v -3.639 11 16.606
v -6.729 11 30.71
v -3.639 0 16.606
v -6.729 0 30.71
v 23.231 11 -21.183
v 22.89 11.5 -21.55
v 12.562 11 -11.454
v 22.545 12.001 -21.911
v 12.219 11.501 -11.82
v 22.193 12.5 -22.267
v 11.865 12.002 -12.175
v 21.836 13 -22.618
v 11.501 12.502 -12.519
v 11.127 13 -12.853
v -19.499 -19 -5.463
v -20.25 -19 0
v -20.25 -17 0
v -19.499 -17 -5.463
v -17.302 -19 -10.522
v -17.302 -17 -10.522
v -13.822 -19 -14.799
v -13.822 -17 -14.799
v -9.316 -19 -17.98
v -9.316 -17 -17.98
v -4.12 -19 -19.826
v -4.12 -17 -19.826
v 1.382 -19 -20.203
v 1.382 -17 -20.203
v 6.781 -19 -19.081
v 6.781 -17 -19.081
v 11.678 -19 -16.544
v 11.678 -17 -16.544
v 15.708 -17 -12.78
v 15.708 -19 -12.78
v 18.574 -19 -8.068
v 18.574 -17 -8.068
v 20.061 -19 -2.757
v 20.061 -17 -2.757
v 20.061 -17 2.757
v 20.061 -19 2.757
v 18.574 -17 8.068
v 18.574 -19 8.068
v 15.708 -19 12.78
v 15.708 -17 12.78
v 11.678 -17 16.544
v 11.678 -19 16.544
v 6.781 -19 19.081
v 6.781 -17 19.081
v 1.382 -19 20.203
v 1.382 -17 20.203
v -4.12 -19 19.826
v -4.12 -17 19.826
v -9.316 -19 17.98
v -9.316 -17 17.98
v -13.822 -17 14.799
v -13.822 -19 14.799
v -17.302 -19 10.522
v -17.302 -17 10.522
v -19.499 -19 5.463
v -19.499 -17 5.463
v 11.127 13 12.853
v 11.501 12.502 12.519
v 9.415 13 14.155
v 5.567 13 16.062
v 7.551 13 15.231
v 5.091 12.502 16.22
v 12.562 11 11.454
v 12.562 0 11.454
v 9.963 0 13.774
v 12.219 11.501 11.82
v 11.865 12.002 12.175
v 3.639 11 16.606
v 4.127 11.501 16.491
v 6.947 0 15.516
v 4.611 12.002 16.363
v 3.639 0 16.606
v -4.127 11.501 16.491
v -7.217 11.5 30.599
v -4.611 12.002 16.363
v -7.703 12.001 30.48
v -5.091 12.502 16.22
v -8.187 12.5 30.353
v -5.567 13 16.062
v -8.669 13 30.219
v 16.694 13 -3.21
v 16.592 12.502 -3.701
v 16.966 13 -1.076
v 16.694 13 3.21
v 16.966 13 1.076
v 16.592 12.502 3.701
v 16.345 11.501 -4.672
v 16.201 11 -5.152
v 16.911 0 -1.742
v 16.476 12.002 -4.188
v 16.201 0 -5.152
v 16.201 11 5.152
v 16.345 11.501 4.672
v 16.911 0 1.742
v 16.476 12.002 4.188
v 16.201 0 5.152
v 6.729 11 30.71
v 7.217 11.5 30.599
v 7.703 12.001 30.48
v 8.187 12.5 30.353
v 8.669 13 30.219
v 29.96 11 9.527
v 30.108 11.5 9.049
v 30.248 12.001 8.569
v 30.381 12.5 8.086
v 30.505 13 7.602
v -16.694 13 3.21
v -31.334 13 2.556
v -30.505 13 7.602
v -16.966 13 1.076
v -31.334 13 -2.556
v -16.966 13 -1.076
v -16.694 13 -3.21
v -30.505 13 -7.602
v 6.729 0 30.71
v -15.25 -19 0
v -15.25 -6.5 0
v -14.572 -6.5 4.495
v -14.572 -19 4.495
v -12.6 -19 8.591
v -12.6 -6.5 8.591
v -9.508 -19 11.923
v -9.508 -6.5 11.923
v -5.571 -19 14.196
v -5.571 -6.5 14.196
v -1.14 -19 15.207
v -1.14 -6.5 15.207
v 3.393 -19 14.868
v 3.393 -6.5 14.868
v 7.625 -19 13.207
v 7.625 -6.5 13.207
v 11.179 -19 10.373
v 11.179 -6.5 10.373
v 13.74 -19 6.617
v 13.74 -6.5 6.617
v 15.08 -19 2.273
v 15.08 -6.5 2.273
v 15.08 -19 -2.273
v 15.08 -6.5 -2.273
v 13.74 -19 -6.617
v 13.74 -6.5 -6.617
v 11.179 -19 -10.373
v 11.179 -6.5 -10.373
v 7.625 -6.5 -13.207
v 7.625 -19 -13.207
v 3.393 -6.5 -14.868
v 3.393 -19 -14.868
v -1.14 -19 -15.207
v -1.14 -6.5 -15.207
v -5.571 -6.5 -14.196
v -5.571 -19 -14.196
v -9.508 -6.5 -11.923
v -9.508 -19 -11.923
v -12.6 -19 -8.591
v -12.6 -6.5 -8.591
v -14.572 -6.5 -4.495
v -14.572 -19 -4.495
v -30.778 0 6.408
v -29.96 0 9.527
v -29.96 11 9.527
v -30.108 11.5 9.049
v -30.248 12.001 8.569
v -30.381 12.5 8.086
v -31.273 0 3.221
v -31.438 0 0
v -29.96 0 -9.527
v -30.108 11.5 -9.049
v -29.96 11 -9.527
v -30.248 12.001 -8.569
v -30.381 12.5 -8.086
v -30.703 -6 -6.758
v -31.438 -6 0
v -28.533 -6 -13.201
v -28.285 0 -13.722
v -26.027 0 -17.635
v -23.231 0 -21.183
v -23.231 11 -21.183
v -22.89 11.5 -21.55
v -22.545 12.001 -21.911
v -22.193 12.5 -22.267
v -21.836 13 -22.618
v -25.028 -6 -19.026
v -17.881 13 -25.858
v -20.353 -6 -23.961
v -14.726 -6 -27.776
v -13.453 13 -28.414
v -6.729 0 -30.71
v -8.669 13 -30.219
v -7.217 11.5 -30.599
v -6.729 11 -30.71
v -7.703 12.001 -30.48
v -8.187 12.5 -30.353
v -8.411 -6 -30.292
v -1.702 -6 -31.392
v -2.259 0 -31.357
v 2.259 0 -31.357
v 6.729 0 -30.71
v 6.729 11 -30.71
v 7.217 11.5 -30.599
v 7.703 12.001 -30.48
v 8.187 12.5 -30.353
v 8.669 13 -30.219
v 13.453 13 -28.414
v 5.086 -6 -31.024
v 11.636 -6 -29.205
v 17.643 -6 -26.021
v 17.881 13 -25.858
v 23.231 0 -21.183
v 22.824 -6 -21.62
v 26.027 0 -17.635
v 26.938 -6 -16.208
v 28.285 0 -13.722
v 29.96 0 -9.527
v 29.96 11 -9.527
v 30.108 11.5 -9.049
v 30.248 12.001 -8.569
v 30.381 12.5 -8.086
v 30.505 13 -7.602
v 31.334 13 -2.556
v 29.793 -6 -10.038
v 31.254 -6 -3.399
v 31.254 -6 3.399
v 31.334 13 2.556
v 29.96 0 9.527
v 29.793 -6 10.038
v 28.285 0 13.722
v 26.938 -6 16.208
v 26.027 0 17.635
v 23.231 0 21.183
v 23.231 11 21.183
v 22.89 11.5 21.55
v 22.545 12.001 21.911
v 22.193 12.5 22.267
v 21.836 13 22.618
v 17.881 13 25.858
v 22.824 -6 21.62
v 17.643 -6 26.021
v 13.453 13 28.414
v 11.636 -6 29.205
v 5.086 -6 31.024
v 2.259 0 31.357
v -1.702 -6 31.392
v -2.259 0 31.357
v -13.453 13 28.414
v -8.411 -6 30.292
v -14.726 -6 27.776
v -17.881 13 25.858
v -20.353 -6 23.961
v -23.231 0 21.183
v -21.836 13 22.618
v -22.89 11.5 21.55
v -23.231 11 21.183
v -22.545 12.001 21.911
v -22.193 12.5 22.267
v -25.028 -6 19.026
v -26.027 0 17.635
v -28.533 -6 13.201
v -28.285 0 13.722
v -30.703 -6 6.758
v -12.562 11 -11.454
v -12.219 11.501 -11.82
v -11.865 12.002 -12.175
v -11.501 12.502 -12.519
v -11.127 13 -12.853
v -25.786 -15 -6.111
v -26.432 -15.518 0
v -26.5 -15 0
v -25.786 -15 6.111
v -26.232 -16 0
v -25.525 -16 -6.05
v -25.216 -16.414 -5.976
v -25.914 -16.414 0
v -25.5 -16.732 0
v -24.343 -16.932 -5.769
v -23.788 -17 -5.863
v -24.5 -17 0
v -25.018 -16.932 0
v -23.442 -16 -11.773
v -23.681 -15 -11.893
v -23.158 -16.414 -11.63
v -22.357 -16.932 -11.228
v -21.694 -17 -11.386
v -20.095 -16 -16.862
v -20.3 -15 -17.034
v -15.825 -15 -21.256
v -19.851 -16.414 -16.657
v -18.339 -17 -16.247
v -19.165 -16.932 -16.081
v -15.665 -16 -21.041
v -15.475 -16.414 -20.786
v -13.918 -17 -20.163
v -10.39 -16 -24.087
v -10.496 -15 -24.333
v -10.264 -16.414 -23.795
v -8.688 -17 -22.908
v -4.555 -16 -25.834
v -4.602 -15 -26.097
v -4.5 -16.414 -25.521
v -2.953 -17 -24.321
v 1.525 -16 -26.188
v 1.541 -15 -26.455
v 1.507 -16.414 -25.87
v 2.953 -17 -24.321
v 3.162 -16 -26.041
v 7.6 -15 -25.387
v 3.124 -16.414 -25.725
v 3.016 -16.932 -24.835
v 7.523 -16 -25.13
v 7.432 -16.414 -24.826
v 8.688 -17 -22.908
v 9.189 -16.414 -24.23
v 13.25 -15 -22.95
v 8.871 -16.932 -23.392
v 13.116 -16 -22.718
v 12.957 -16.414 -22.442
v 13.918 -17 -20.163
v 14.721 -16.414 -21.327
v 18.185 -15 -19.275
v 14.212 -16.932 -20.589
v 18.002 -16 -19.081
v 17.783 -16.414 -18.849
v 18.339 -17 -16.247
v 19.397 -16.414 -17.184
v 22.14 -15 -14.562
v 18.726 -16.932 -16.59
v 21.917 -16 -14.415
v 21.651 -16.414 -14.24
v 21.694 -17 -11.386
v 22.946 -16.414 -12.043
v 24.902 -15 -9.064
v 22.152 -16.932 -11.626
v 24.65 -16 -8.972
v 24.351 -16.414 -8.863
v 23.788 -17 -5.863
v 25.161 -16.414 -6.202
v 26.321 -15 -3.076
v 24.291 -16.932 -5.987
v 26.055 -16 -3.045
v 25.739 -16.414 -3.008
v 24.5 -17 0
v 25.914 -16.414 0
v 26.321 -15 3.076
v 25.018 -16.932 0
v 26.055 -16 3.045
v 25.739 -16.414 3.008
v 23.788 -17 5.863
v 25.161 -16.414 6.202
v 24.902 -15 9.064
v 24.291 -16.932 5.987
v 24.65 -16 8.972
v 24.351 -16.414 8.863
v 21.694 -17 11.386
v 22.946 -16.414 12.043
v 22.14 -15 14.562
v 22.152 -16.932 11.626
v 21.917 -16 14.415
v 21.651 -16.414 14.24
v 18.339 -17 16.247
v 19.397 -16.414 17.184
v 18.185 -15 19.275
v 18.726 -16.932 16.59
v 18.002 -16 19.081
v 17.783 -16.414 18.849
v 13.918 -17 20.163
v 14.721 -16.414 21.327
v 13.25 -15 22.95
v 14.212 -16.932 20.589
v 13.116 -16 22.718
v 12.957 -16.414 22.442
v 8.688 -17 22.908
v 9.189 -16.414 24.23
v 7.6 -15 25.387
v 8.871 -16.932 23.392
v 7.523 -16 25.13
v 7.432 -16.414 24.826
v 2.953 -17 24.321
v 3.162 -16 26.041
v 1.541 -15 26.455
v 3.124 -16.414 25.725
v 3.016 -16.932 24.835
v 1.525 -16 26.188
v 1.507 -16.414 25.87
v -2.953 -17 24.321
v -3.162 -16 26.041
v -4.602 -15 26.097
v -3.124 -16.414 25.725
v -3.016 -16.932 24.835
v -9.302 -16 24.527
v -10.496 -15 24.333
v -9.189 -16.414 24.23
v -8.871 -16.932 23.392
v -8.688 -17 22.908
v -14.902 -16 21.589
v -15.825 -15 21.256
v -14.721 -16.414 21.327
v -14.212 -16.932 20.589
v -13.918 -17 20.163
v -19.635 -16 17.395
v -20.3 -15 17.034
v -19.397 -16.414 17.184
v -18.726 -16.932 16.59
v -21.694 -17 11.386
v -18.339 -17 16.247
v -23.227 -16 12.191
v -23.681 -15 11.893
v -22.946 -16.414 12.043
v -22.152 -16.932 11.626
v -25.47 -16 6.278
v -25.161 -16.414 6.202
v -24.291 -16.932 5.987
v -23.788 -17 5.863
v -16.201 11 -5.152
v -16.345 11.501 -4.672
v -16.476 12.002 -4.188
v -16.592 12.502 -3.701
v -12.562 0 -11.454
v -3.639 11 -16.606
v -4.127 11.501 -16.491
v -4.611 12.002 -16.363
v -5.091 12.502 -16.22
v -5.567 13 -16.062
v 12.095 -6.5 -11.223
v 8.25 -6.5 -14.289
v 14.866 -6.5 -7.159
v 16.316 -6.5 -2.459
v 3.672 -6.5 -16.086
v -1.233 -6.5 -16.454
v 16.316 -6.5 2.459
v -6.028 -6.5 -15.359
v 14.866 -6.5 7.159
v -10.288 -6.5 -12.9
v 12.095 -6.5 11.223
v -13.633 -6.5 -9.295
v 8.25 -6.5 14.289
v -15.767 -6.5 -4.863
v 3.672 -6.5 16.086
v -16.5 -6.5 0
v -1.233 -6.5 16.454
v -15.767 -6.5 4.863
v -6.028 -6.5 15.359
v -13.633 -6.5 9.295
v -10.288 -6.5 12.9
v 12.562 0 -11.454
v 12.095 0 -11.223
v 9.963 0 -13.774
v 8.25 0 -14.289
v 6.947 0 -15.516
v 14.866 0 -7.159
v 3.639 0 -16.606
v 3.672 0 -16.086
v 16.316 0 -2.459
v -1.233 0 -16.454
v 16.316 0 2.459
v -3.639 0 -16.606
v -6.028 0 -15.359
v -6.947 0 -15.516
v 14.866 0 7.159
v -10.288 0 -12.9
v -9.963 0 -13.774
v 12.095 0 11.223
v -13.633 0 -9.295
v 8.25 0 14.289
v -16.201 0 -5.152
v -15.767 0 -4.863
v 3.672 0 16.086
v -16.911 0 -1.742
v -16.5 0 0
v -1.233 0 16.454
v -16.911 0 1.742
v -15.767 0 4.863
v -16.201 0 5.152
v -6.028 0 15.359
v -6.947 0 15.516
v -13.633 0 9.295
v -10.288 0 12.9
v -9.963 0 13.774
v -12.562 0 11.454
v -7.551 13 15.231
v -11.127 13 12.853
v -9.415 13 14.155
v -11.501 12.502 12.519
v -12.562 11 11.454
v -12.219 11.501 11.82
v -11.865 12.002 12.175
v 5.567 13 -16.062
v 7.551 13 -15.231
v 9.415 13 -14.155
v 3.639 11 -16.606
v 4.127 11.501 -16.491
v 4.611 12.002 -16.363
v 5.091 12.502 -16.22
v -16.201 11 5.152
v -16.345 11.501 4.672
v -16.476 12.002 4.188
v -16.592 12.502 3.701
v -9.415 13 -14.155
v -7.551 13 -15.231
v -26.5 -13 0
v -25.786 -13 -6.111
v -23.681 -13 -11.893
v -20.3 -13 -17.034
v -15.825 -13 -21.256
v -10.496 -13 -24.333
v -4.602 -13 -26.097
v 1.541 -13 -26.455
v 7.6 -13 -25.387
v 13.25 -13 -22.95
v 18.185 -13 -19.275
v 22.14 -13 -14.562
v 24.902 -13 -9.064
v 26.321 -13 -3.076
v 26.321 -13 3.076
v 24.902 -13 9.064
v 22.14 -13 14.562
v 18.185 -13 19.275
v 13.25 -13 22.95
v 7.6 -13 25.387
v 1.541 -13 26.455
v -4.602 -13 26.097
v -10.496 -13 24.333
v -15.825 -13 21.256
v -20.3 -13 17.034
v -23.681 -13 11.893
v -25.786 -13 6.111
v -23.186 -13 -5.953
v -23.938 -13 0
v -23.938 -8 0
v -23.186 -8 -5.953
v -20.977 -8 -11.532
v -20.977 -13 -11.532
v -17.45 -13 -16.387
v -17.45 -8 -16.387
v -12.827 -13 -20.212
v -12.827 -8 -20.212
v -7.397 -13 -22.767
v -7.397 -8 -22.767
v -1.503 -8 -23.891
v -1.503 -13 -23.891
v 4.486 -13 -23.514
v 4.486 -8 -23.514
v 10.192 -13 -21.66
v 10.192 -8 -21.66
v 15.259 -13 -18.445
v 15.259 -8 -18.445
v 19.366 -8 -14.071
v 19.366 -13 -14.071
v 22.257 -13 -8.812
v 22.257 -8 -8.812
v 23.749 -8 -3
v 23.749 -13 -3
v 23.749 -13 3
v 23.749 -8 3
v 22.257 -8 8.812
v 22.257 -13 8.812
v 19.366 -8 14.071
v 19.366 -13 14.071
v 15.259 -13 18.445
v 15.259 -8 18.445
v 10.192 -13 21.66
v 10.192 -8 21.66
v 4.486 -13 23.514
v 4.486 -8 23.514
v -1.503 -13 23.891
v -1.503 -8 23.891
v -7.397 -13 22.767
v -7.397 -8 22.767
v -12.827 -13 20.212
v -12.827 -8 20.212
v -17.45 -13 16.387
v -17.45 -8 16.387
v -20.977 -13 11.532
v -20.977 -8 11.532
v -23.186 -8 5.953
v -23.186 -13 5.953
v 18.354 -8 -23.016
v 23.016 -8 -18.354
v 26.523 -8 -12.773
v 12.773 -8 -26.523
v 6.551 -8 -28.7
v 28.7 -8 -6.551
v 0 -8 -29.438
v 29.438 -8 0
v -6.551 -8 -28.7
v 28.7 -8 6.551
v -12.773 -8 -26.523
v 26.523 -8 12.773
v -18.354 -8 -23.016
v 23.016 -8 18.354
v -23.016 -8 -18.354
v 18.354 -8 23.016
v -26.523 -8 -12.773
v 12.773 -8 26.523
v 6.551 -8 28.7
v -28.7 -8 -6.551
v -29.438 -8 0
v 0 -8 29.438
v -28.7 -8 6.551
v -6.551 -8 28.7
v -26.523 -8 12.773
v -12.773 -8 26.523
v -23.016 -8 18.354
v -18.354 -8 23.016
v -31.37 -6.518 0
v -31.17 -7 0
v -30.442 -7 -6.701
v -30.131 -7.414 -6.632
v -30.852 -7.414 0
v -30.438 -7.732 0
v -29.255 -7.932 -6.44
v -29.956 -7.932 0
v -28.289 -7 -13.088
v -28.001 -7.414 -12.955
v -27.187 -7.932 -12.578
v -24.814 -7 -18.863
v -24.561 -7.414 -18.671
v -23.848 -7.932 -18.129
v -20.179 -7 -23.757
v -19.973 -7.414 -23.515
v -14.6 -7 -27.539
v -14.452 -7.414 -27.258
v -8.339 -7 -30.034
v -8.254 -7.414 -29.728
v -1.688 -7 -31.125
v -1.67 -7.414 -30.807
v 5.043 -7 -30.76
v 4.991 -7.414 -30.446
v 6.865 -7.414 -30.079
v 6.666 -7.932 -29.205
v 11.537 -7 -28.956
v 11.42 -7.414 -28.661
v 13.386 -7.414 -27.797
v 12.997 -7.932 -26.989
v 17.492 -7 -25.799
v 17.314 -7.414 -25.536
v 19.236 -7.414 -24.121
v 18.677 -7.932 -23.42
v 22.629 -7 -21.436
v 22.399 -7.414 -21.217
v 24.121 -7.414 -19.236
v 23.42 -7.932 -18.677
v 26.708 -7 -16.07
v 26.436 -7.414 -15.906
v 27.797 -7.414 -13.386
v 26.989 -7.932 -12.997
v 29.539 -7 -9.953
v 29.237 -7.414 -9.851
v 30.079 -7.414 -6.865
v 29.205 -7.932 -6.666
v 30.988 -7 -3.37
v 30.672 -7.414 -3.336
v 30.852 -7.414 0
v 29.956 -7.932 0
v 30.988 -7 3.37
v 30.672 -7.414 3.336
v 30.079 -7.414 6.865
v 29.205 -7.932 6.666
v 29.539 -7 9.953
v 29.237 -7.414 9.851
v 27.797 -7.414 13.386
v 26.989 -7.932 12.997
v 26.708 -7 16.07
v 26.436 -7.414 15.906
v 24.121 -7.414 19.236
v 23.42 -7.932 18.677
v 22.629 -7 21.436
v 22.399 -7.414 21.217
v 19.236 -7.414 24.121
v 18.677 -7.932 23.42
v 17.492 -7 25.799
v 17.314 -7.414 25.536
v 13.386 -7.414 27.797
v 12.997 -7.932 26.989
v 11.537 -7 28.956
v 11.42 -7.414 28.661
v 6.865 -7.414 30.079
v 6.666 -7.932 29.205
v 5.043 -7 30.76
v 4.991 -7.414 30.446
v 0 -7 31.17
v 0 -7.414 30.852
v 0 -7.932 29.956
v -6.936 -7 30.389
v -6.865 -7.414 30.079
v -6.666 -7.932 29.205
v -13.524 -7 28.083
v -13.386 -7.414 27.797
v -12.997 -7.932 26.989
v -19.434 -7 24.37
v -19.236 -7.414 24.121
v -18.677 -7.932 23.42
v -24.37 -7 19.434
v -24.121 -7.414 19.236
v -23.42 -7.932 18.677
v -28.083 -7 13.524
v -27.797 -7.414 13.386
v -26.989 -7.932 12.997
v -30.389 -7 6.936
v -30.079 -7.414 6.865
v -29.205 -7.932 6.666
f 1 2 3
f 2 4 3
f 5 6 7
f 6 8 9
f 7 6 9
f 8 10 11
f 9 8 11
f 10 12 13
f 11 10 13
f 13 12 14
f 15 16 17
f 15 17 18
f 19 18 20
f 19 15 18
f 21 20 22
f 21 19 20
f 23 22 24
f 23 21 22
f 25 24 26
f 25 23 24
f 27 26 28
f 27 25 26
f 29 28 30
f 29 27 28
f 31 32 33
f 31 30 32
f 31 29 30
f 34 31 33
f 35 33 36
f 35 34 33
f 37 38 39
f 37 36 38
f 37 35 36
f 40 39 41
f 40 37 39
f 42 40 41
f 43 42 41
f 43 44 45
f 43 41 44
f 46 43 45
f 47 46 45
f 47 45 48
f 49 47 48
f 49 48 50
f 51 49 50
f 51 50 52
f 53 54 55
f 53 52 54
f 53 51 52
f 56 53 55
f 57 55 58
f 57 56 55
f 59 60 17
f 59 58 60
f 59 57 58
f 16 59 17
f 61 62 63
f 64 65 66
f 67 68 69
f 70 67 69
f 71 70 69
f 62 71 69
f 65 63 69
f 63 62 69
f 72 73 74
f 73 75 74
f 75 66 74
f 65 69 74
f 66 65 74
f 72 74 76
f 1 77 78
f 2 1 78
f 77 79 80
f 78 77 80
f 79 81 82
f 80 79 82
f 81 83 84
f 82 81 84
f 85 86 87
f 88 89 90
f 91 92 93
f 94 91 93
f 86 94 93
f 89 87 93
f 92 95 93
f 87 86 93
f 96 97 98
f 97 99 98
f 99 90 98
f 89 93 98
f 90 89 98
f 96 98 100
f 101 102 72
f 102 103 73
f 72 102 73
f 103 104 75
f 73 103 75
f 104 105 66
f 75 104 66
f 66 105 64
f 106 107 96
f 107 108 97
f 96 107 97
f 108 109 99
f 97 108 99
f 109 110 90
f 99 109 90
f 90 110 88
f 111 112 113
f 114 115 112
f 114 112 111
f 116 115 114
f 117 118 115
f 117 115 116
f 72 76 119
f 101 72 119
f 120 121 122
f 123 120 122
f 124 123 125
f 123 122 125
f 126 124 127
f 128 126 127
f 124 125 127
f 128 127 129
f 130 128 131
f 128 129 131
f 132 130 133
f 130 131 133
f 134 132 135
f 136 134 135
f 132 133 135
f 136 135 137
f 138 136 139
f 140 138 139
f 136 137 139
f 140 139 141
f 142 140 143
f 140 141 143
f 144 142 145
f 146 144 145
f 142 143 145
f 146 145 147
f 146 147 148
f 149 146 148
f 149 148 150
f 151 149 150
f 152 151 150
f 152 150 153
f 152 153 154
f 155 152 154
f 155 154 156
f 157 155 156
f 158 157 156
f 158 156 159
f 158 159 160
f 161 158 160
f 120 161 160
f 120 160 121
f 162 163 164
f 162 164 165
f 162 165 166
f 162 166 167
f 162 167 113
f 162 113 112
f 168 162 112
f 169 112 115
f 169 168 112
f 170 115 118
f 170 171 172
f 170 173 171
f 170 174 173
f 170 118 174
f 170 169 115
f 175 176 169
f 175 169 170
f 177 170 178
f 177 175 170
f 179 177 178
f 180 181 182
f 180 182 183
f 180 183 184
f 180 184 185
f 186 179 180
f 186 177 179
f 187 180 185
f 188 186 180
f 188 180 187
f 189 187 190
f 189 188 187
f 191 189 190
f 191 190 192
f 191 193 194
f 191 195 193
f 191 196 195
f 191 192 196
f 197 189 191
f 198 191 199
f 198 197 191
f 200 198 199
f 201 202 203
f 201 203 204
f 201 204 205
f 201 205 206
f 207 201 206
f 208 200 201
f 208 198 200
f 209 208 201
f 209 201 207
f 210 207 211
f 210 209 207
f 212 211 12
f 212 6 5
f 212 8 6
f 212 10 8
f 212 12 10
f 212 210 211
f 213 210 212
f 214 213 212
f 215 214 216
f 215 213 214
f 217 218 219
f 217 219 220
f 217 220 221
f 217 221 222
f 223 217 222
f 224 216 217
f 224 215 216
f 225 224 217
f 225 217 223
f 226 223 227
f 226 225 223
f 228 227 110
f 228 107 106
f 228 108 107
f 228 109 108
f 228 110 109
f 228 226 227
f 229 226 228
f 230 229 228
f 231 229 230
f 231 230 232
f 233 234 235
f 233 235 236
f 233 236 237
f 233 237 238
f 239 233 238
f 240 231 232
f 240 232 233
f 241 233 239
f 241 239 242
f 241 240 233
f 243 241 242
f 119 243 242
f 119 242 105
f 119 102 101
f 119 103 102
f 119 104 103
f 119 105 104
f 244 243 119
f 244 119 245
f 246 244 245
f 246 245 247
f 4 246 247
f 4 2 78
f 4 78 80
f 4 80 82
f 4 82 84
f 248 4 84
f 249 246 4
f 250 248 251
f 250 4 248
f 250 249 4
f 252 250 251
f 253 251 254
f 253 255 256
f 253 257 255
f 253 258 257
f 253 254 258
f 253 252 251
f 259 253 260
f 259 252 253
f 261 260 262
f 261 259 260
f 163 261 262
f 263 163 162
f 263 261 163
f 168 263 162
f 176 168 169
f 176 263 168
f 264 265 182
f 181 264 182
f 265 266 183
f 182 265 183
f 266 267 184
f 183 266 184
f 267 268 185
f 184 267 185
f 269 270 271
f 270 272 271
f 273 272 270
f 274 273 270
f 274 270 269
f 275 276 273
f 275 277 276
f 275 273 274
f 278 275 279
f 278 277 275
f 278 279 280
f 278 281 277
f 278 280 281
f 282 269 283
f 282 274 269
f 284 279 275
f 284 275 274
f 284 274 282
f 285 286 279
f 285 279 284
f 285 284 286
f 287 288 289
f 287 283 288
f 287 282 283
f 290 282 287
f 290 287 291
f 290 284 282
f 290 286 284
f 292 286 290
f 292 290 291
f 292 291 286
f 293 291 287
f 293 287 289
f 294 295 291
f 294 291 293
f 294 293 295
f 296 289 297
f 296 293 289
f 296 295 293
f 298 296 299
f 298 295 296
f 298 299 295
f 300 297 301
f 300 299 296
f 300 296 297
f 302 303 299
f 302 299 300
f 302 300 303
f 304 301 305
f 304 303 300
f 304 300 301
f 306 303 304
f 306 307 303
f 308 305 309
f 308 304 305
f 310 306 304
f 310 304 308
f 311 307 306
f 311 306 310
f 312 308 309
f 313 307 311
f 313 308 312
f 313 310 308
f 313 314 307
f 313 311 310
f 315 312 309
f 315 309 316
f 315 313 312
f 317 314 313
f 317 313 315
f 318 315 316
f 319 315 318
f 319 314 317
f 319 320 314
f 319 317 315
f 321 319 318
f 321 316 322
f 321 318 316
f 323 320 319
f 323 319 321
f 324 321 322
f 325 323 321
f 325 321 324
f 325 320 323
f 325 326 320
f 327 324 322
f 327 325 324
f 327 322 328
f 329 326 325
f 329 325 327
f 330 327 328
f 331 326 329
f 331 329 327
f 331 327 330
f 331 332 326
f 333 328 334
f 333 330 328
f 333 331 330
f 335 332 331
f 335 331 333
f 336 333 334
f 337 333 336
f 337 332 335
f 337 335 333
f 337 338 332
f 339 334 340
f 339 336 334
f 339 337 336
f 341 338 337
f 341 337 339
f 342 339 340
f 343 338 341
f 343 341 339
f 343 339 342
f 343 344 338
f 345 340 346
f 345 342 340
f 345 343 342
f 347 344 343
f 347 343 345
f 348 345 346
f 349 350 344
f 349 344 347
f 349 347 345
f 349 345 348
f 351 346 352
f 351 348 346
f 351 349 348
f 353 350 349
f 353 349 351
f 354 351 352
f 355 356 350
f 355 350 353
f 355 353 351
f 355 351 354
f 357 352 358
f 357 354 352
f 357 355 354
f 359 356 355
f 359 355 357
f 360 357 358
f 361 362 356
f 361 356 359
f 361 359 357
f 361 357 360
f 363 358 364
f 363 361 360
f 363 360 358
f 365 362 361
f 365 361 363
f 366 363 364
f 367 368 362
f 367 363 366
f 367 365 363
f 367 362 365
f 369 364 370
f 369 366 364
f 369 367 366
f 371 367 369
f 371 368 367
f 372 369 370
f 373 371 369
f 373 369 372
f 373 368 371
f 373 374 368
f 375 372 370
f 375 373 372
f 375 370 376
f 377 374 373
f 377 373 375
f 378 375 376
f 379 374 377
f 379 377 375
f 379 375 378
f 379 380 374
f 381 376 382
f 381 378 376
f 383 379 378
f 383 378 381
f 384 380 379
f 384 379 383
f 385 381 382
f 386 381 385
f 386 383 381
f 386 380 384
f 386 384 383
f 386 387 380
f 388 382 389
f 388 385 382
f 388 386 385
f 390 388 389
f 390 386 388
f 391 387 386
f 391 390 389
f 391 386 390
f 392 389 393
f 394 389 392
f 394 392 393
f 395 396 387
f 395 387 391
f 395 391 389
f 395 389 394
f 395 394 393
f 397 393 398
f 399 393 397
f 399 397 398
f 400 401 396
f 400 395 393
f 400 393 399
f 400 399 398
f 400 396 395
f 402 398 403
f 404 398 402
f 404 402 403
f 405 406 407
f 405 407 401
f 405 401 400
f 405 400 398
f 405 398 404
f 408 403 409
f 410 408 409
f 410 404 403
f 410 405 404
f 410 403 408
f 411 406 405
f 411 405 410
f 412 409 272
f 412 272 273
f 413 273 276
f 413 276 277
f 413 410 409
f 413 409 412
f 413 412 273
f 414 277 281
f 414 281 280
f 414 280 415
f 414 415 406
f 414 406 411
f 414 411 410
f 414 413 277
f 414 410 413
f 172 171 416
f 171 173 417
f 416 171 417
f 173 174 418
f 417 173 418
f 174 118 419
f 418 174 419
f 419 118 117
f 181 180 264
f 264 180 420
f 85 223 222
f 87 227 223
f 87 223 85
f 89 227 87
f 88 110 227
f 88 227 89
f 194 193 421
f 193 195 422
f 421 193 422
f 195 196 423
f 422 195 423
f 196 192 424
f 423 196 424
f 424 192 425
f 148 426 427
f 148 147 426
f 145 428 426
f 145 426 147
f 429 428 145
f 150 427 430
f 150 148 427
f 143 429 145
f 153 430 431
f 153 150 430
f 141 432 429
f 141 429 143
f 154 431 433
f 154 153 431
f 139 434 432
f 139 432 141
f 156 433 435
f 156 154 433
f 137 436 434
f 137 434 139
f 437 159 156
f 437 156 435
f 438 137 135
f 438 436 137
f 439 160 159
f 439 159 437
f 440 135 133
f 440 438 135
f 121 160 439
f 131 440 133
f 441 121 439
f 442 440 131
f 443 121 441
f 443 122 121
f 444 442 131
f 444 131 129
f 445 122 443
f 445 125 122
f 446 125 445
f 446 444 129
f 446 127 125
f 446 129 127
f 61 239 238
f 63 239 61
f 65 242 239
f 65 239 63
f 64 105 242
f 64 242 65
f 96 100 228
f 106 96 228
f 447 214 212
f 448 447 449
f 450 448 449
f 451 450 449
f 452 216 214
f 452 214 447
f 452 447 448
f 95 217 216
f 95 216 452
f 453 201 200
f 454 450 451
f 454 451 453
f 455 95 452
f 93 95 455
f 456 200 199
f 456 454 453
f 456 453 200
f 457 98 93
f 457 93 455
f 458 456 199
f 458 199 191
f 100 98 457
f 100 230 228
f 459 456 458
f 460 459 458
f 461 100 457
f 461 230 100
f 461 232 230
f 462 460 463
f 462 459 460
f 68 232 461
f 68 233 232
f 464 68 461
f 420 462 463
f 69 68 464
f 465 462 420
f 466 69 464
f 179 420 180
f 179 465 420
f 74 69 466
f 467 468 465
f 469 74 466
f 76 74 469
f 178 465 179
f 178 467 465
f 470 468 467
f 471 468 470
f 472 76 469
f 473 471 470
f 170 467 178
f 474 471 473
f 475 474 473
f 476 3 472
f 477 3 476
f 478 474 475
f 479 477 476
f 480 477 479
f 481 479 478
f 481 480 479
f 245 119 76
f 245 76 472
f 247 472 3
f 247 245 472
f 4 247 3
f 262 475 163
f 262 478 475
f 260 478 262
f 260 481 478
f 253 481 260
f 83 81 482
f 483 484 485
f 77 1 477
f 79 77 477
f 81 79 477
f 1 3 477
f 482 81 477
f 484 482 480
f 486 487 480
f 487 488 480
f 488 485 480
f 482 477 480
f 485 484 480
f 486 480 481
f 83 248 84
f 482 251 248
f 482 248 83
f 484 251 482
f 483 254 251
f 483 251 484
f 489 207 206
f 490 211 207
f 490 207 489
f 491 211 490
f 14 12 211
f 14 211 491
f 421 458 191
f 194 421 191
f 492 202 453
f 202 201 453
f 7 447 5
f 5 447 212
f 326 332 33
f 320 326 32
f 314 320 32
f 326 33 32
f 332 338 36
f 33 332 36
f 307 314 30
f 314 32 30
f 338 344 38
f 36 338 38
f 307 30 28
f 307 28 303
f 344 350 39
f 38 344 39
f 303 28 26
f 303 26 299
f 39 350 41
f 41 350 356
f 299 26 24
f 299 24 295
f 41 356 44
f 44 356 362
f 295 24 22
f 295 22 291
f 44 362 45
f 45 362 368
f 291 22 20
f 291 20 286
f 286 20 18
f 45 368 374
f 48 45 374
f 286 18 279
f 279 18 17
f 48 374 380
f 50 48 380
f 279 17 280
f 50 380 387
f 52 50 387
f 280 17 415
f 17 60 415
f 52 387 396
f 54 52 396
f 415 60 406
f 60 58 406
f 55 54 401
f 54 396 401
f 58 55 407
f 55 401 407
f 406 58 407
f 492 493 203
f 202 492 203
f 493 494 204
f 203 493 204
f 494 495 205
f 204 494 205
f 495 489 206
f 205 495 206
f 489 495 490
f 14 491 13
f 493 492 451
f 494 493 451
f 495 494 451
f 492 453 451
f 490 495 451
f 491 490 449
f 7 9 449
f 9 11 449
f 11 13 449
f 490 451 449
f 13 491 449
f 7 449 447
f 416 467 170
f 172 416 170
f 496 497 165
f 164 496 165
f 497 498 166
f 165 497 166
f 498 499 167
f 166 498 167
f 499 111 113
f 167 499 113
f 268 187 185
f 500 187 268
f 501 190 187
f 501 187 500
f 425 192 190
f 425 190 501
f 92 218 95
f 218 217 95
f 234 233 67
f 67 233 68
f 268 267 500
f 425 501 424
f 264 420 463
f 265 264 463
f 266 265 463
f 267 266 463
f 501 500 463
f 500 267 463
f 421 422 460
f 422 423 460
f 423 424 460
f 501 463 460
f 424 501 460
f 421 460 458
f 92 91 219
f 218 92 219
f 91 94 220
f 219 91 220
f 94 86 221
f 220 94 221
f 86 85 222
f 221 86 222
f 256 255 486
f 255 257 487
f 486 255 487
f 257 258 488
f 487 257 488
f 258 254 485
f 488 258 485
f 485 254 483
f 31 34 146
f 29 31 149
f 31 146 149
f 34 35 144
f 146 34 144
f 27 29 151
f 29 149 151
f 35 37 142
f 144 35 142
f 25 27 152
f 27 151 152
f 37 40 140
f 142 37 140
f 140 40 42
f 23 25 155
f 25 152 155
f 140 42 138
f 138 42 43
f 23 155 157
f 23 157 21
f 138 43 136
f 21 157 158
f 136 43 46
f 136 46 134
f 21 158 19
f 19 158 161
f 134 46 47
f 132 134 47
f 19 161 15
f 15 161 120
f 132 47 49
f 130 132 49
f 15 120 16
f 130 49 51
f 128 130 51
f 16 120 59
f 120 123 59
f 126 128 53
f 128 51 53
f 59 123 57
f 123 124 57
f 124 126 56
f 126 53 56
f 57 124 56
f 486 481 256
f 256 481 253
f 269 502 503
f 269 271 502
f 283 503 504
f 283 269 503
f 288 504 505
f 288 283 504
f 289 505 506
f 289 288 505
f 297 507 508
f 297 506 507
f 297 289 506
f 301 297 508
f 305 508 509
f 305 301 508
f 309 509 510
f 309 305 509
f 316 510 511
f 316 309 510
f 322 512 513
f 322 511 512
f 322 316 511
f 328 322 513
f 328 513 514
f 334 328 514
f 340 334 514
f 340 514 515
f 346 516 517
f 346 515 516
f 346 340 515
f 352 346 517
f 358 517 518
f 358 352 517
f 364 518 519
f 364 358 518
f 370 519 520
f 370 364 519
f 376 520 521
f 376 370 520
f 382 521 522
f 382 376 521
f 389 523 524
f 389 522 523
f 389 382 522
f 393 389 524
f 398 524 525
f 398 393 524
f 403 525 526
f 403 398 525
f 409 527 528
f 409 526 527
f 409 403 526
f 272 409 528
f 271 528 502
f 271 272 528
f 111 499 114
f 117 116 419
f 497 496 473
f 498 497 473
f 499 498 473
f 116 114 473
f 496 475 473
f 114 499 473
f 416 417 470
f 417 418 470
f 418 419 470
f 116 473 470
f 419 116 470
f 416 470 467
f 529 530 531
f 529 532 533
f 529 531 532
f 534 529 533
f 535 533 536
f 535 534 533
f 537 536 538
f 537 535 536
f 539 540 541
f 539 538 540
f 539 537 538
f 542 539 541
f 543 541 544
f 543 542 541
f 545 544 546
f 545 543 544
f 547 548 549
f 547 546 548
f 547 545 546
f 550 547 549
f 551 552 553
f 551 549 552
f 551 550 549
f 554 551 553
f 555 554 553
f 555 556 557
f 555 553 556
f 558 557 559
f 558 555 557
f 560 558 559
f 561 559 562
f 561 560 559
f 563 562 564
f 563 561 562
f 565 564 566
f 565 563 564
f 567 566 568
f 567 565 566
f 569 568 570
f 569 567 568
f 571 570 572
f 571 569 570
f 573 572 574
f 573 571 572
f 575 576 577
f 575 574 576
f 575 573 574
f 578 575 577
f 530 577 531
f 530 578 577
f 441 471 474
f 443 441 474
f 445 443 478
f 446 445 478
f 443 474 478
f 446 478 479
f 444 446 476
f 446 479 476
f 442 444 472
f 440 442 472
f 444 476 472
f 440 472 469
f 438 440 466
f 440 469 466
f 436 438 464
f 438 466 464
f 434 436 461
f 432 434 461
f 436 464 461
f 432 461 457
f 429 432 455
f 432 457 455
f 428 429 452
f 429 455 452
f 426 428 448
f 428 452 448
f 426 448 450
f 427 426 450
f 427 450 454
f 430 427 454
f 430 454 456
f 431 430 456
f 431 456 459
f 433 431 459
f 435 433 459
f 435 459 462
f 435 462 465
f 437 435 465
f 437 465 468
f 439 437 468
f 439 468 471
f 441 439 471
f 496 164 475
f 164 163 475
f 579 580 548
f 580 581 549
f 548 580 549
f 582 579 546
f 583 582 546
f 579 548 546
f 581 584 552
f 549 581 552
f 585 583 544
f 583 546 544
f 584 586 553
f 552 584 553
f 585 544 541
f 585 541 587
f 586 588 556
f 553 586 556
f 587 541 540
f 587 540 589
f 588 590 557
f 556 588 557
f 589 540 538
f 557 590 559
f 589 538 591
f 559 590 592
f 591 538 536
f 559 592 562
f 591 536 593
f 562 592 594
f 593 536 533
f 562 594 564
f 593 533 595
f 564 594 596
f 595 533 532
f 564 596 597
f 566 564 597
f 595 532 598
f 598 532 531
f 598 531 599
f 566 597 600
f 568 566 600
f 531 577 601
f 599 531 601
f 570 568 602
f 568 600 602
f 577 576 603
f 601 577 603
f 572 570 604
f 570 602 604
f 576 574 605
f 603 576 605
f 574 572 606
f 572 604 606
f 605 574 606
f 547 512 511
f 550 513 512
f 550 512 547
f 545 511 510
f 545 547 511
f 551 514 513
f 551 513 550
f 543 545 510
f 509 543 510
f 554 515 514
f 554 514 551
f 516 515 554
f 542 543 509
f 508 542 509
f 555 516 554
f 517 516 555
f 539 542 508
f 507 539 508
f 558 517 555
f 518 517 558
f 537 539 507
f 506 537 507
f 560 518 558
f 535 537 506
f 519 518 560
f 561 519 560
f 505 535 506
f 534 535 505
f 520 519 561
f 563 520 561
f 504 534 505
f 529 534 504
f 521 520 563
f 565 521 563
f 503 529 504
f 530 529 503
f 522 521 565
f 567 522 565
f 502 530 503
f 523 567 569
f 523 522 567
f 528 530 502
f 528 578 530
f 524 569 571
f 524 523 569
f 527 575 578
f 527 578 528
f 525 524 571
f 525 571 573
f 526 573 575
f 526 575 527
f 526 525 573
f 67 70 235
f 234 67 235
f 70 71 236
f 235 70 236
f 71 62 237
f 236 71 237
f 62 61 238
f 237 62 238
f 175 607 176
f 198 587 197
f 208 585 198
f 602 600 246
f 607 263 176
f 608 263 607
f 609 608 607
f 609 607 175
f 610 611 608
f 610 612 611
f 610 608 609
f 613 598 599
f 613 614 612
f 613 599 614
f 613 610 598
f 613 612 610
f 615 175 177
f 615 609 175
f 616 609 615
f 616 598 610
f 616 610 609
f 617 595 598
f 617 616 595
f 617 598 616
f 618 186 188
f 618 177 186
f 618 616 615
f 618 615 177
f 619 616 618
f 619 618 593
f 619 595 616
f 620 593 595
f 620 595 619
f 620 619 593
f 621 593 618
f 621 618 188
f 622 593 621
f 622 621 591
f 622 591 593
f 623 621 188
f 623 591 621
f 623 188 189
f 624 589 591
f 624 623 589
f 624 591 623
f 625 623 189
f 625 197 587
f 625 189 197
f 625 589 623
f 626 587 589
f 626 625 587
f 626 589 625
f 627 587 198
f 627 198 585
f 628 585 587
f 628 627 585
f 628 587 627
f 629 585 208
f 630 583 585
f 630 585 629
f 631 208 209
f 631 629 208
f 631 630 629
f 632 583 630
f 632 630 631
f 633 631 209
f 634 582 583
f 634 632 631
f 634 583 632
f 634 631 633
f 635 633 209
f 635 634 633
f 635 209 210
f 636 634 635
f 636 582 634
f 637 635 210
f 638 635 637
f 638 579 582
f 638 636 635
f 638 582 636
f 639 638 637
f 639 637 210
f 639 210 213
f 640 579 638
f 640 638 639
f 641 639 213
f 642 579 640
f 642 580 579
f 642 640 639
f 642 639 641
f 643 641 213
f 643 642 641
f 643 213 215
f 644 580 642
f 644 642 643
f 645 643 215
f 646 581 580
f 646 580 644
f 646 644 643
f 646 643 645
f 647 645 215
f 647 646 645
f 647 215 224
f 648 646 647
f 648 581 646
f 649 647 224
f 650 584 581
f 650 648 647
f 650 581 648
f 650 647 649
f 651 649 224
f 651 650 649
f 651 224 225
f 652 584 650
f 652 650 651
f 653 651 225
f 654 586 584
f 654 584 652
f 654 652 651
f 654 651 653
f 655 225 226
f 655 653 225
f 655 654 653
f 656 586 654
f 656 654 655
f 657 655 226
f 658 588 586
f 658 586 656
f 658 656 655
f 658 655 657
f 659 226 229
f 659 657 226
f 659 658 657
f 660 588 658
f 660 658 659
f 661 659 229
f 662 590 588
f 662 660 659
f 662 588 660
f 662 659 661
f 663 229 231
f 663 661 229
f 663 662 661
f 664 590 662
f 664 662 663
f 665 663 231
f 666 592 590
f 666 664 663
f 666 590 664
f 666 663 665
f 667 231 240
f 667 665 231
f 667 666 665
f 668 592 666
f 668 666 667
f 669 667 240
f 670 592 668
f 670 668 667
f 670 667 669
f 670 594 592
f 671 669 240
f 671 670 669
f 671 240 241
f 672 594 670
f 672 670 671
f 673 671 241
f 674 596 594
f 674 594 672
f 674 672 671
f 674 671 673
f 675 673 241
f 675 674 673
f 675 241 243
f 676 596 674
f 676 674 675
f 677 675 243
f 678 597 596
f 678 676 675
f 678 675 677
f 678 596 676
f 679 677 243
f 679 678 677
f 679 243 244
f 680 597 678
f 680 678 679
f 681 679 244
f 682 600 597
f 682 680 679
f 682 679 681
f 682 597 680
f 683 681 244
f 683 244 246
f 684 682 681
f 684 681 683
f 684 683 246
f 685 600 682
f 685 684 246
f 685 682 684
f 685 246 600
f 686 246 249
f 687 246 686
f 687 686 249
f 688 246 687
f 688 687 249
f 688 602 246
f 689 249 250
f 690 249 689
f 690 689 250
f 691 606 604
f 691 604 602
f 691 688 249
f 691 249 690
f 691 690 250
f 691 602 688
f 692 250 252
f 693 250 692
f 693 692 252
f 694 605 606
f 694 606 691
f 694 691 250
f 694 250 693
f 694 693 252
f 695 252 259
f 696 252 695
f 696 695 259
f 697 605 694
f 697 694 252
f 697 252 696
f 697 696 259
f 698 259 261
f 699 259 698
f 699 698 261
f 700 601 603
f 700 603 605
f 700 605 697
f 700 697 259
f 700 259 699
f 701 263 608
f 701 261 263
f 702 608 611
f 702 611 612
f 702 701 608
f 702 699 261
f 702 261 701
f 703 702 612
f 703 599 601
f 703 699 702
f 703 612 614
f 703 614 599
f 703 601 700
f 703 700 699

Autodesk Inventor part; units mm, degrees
ref_plane "YZ Plane" through (0, 0, 0) normal (1, 0, 0) x (0, 1, 0)
ref_plane "XZ Plane" through (0, 0, 0) normal (0, 1, 0) x (-1, 0, 0)
ref_plane "XY Plane" through (0, 0, 0) normal (0, 0, 1) x (1, 0, 0)
sketch "Sketch1" plane through (0, 0, 0) normal (0, 0, 1) x (1, 0, 0)
  line L0 (-31.4382, 0) -> (-31.4382, -8)
  line L1 (-26.5, -13) -> (-26.5, -17)
  line L2 (-26.5, -17) -> (-20.25, -17)
  line L3 (-20.25, -17) -> (-20.25, -19)
  line L4 (-20.25, -19) -> (-15.25, -19)
  line L5 (-15.25, -19) -> (-15.25, -6.5)
  line L6 (-15.25, -6.5) -> (-16.5, -6.5)
  line L7 (-16.5, -6.5) -> (-16.5, 0)
  line L8 (-26.5, -13) -> (-23.9382, -13)
  line L9 (-31.4382, 0) -> (-16.5, 0)
  line L10 (-37.7259, 0) -> (6.2876, 0) projected
  line L11 (-31.4382, -8) -> (-23.9382, -8)
  line L12 (-23.9382, -8) -> (-23.9382, -13)
  line L13 (0, -22.8) -> (0, 3.8) projected
  point P0 (0, 0)
  dimension "d1" = 15.25
  dimension "d2" = 5
  dimension "d3" = 6.25
  dimension "d4" = 2
  dimension "d6" = 4
  dimension "d8" = 8
  dimension "d10" = 6.5
  dimension "d11" = 16.5
  dimension "d12" = 14.9382
  dimension "d14" = 5
  dimension "d15" = 7.5
revolve "Revolution1" add sketch "Sketch1" angle 360 about axis through (0, -10, 0) along (0, 1, 0)
sketch "Sketch2" plane through (0, 0, 0) normal (0, 1, 0) x (1, 0, 0)
  circle A0 centre (0, 0) radius 17 construction
  line L0 (0, 0) -> (-36.8022, 11.7026)
  line L1 (-36.8022, -11.7026) -> (0, 0)
  line L2 (-50.4503, 0) -> (45.0863, 0) projected
  arc A1 (-16.2006, 5.1516) -> (-16.2006, -5.1516) centre (0, 0) ccw
  circle A2 centre (0, 0) radius 31.4382 projected
  arc A3 (-29.96, 9.5269) -> (-29.96, -9.5269) centre (0, 0) ccw
  line L3 (-29.96, -9.5269) -> (-16.2006, -5.1516)
  line L4 (-29.96, 9.5269) -> (-16.2006, 5.1516)
  dimension "d17" = 34
  dimension "d18" = 35.28
extrude "Extrusion1" add sketch "Sketch2" along normal blind 13 contours A1 L2 A2 L0 | L1 A2 L2 A1
chamfer "Chamfer1" distance 2 angle 45 2 edges at (-23.0803, 13, -7.3392) (-23.0803, 13, 7.3392)
pattern_circular "Circular Pattern1" count 6 over 360 about axis through (0, -10, 0) along (0, 1, 0) of "Extrusion1", "Chamfer1"
fillet "Fillet1" radius 2 2 edges at (31.4382, -8, 0) (26.5, -17, 0)
properties part number "shaft_fixture"
